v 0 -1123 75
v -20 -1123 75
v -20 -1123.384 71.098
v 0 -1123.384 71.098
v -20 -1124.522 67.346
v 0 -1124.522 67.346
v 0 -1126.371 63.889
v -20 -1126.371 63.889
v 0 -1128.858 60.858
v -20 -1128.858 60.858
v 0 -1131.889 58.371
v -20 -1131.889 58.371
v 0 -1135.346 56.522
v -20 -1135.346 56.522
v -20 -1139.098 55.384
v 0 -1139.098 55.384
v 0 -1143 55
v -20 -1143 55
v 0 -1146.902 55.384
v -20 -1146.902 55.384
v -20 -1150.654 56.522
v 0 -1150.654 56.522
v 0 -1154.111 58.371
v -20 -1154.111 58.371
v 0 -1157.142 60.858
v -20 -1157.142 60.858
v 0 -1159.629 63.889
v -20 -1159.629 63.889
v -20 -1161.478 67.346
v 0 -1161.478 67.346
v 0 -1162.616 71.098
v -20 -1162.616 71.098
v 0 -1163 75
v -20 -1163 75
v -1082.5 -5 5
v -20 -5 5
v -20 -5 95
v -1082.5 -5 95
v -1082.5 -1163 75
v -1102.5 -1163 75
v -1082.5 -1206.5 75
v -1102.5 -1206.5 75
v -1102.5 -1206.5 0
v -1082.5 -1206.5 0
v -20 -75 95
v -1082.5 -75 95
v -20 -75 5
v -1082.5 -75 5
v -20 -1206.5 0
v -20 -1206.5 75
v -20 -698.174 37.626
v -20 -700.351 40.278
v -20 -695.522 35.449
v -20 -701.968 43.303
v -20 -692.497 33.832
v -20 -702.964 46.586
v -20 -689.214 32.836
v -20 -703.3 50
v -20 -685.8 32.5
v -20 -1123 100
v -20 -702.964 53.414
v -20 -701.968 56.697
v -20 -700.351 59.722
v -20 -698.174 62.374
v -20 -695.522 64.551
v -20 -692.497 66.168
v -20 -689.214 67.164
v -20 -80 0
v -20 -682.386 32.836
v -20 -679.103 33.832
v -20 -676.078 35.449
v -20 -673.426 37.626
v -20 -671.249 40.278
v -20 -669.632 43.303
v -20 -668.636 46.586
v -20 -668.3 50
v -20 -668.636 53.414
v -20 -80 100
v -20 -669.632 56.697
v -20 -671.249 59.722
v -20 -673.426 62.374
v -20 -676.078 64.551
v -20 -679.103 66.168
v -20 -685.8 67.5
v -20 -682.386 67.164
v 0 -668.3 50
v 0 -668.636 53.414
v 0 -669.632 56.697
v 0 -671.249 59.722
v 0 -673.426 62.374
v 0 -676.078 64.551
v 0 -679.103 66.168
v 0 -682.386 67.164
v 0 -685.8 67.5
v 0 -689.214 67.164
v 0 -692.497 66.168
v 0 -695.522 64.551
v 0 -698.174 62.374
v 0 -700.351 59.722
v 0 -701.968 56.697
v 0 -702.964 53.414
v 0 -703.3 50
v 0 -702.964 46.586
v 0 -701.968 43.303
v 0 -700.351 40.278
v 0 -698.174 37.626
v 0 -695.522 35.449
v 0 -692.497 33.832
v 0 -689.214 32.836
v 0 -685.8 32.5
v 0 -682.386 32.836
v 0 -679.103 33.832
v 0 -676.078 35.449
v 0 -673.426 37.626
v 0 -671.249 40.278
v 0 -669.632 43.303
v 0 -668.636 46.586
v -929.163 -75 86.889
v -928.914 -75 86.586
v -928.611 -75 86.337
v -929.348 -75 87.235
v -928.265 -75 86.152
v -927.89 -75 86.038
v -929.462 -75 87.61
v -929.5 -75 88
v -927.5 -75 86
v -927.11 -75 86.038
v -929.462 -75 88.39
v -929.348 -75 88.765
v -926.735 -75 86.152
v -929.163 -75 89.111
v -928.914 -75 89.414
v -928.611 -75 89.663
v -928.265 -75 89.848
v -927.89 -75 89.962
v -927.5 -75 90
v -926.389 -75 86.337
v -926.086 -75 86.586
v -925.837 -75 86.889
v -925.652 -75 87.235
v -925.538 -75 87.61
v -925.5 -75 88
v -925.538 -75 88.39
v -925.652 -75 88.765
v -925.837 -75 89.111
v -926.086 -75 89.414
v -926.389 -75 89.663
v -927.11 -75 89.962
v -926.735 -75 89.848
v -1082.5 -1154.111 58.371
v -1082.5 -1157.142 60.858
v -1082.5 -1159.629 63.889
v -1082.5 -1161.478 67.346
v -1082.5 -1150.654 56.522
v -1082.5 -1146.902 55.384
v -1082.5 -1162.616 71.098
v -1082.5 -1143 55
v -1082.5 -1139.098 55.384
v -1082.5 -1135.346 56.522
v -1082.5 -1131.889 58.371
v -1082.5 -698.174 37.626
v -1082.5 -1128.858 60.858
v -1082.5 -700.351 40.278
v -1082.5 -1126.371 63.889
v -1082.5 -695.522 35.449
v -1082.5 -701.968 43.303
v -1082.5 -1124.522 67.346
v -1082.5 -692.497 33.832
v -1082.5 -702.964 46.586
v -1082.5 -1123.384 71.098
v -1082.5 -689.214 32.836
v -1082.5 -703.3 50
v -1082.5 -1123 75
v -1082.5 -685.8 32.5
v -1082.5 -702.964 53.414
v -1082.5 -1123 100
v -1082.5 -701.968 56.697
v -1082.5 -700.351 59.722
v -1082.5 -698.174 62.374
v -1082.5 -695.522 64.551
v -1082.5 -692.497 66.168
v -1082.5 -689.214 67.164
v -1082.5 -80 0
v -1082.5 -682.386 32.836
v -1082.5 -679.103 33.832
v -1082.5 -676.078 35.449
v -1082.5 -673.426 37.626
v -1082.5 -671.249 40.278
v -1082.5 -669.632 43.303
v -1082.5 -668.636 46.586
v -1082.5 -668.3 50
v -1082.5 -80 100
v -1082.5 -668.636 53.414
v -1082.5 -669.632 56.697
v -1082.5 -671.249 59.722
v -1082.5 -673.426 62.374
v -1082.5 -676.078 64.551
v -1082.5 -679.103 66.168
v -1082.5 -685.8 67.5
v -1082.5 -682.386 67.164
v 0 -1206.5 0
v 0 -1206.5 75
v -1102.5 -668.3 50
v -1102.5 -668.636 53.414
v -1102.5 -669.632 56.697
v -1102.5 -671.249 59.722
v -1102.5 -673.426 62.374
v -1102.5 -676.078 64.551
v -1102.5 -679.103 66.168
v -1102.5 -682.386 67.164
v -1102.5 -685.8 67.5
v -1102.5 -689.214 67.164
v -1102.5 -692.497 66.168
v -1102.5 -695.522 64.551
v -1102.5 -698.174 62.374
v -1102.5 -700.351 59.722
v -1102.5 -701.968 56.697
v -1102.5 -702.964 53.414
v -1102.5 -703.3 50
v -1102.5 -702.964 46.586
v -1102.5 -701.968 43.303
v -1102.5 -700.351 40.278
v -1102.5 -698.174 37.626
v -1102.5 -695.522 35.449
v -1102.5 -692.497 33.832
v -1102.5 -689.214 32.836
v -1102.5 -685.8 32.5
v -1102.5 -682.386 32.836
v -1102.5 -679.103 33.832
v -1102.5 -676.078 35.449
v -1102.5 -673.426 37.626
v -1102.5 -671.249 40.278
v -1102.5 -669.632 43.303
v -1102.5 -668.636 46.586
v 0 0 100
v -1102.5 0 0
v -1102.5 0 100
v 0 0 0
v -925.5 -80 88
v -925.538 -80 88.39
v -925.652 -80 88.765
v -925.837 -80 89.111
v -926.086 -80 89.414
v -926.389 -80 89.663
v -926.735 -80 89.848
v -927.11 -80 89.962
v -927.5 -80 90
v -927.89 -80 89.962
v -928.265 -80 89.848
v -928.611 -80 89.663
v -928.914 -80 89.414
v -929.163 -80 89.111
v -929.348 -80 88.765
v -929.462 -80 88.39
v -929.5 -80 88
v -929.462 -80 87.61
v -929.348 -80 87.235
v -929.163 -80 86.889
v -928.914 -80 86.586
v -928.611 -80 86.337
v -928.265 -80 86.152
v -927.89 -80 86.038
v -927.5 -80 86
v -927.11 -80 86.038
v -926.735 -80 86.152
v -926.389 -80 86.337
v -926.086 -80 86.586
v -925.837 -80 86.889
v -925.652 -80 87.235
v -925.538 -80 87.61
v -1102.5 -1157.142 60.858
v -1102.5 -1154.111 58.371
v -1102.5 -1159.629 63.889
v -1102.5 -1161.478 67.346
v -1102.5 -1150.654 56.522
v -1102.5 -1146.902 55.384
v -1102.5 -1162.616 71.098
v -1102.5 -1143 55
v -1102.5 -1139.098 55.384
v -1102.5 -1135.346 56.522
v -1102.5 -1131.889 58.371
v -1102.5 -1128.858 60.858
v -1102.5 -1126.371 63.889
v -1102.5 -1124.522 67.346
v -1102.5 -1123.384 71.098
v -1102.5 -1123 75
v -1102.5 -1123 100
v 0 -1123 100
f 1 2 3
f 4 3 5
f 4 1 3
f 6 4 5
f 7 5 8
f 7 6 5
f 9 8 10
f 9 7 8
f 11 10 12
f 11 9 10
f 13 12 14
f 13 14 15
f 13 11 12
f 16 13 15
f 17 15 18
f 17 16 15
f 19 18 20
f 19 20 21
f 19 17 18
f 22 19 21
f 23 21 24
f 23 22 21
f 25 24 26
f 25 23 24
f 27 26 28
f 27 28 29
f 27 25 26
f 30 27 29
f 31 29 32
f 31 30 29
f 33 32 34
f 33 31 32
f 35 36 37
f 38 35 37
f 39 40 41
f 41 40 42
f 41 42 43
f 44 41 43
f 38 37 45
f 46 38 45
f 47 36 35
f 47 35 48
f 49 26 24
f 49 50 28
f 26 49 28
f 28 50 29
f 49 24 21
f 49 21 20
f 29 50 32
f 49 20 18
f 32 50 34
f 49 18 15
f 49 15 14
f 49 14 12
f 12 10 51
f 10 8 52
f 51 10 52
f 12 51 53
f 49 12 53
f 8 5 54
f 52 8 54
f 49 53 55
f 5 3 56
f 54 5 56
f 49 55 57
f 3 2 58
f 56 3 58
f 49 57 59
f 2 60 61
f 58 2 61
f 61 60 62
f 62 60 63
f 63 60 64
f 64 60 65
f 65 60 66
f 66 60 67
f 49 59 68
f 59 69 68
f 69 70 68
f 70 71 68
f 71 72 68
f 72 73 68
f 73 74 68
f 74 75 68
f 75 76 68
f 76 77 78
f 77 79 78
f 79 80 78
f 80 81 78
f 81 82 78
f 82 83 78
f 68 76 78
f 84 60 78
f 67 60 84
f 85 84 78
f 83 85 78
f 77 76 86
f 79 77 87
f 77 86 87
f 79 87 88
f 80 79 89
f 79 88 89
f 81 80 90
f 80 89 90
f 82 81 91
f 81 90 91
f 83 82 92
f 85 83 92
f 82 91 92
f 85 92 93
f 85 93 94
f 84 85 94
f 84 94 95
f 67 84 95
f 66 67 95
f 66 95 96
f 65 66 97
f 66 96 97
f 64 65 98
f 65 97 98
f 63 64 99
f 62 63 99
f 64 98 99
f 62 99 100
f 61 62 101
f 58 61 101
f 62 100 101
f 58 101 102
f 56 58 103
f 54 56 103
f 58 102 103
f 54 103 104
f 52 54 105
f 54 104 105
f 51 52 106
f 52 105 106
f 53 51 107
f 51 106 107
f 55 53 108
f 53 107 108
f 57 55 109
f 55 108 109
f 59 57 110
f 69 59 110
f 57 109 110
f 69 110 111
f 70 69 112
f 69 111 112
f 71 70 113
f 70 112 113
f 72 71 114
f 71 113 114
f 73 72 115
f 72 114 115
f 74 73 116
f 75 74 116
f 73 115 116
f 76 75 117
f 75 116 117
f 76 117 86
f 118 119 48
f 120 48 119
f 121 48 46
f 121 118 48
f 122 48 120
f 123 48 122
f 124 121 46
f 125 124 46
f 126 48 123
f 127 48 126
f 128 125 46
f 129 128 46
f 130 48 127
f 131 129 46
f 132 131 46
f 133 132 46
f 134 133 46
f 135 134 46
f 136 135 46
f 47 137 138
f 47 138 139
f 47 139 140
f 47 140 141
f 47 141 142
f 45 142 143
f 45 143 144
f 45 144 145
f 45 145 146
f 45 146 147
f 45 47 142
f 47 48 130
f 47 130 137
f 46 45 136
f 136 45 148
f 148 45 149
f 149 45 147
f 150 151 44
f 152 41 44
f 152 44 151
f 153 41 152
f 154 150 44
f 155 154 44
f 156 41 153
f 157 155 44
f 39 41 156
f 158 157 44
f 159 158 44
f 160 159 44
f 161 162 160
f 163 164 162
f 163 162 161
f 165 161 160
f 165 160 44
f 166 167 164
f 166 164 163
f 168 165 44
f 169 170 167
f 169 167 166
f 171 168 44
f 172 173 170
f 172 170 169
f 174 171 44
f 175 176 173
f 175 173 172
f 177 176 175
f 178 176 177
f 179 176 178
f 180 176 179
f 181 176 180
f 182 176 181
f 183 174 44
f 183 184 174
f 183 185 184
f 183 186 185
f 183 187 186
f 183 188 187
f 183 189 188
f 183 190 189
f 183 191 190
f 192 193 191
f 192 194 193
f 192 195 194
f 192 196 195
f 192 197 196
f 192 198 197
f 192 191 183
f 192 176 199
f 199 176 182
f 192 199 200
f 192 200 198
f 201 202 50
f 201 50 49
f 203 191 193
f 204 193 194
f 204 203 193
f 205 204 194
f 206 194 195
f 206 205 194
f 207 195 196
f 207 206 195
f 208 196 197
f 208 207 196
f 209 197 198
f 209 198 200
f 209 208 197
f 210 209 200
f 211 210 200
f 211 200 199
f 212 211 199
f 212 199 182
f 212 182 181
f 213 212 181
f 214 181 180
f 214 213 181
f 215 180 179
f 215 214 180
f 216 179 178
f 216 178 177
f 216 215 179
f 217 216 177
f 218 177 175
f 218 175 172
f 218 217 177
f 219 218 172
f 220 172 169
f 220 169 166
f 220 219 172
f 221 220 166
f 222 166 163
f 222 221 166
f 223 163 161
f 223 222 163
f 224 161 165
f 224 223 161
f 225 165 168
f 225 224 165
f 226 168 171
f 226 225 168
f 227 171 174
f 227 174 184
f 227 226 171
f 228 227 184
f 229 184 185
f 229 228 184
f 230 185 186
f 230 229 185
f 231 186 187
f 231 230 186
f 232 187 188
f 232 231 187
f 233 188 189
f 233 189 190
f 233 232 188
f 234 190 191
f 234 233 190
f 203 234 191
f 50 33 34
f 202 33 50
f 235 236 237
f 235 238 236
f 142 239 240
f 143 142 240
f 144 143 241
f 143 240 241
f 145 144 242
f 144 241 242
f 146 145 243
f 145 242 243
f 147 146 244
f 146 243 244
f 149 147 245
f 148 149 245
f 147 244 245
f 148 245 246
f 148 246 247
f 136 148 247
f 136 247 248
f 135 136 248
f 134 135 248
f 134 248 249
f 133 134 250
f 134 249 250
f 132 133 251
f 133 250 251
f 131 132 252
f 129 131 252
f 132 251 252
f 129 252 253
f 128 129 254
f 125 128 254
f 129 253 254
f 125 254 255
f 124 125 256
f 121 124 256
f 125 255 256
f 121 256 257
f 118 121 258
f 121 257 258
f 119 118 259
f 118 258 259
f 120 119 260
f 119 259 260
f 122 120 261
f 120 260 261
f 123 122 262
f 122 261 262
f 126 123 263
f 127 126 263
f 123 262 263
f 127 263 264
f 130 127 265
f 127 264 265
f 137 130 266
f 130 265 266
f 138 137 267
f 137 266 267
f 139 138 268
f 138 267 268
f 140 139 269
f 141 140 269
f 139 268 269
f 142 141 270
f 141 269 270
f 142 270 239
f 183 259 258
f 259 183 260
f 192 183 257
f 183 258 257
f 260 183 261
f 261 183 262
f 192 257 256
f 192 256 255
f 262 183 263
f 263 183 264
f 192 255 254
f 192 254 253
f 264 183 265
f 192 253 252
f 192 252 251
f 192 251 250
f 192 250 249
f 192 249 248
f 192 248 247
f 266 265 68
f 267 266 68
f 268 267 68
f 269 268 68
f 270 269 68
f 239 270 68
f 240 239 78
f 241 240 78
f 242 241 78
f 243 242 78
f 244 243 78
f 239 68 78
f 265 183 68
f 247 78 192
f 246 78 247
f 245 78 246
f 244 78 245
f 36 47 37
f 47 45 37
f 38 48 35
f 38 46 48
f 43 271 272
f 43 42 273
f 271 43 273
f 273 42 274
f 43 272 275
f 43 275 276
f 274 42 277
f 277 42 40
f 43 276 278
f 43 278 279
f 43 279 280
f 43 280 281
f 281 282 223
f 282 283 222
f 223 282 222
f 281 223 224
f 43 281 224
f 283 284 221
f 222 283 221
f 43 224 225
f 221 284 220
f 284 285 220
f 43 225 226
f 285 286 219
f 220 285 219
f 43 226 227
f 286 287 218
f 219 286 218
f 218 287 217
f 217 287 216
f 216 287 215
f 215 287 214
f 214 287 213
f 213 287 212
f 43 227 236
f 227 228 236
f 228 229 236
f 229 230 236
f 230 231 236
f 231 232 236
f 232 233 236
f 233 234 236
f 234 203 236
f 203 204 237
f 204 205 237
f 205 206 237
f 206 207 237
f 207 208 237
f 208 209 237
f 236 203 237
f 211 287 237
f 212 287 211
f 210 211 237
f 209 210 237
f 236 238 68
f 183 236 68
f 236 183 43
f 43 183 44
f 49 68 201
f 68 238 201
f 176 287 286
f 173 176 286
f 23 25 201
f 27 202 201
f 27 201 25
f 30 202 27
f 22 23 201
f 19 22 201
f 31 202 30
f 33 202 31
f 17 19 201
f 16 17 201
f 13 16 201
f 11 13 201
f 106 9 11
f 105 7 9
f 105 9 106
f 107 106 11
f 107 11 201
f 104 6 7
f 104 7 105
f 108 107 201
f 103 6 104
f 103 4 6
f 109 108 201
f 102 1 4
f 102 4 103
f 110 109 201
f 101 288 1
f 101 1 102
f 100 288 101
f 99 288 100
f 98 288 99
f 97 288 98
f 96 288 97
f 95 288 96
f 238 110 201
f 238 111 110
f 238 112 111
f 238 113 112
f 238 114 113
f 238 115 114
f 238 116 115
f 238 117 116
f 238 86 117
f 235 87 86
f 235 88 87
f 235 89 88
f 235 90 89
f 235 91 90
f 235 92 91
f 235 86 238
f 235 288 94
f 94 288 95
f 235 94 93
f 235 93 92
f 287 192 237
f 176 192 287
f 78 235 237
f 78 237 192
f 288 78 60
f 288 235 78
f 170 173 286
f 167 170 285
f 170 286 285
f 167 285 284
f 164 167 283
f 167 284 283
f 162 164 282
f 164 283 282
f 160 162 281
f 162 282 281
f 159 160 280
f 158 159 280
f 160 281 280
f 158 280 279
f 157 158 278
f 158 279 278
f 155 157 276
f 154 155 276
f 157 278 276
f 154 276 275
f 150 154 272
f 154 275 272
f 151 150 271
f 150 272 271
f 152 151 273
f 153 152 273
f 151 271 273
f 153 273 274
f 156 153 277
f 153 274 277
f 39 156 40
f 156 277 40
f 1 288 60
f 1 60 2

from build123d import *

# Parameters (mm, degrees)
F0_R     = 17.5
F1_DEPTH = 20
F2_W     = 80
F2_H     = 100
F2_W_2   = 70
F2_H_2   = 90
F3_DEPTH = 1062.5
F6_R     = 2
F7_DEPTH = 5


with BuildPart() as f1:
    # F0 (on Right) → F1 (new body)
    with BuildSketch(Plane.YZ):
        with BuildLine():
            Line((-1206.5, 0), (0, 0))
            Line((0, 0), (0, 100))
            Line((0, 100), (-1123, 100))
            Line((-1123, 100), (-1123, 75))
            ThreePointArc((-1123, 75), (-1143, 55), (-1163, 75))
            Line((-1163, 75), (-1206.5, 75))
            Line((-1206.5, 75), (-1206.5, 0))
        make_face()
        with Locations((-685.8, 50)):
            Circle(F0_R, mode=Mode.SUBTRACT)
    extrude(amount=-F1_DEPTH)

    # F2 (on face) → F3 (join)
    with BuildSketch(Plane(origin=(-20, 0, 0), x_dir=(0, -1, 0), z_dir=(-1, 0, 0))):
        with Locations((40, 50)):
            Rectangle(F2_W, F2_H)
        with Locations((40, 50)):
            Rectangle(F2_W_2, F2_H_2, mode=Mode.SUBTRACT)
    extrude(amount=F3_DEPTH)

    # F5: F1 across plane


with BuildPart() as f1_1:
    add(f1.part)
    add(f1.part.mirror(Plane(origin=(-551.25, -630.0028317099, 49.186434827), x_dir=(0, -1, 0), z_dir=(-1, 0, 0))))

    # F6 (on face) → F7 (cut, through all)
    with BuildSketch(Plane.XZ.offset(80)):
        with Locations((-927.5, 88)):
            Circle(F6_R)
    extrude(amount=-F7_DEPTH, mode=Mode.SUBTRACT)


solid = f1_1.part
